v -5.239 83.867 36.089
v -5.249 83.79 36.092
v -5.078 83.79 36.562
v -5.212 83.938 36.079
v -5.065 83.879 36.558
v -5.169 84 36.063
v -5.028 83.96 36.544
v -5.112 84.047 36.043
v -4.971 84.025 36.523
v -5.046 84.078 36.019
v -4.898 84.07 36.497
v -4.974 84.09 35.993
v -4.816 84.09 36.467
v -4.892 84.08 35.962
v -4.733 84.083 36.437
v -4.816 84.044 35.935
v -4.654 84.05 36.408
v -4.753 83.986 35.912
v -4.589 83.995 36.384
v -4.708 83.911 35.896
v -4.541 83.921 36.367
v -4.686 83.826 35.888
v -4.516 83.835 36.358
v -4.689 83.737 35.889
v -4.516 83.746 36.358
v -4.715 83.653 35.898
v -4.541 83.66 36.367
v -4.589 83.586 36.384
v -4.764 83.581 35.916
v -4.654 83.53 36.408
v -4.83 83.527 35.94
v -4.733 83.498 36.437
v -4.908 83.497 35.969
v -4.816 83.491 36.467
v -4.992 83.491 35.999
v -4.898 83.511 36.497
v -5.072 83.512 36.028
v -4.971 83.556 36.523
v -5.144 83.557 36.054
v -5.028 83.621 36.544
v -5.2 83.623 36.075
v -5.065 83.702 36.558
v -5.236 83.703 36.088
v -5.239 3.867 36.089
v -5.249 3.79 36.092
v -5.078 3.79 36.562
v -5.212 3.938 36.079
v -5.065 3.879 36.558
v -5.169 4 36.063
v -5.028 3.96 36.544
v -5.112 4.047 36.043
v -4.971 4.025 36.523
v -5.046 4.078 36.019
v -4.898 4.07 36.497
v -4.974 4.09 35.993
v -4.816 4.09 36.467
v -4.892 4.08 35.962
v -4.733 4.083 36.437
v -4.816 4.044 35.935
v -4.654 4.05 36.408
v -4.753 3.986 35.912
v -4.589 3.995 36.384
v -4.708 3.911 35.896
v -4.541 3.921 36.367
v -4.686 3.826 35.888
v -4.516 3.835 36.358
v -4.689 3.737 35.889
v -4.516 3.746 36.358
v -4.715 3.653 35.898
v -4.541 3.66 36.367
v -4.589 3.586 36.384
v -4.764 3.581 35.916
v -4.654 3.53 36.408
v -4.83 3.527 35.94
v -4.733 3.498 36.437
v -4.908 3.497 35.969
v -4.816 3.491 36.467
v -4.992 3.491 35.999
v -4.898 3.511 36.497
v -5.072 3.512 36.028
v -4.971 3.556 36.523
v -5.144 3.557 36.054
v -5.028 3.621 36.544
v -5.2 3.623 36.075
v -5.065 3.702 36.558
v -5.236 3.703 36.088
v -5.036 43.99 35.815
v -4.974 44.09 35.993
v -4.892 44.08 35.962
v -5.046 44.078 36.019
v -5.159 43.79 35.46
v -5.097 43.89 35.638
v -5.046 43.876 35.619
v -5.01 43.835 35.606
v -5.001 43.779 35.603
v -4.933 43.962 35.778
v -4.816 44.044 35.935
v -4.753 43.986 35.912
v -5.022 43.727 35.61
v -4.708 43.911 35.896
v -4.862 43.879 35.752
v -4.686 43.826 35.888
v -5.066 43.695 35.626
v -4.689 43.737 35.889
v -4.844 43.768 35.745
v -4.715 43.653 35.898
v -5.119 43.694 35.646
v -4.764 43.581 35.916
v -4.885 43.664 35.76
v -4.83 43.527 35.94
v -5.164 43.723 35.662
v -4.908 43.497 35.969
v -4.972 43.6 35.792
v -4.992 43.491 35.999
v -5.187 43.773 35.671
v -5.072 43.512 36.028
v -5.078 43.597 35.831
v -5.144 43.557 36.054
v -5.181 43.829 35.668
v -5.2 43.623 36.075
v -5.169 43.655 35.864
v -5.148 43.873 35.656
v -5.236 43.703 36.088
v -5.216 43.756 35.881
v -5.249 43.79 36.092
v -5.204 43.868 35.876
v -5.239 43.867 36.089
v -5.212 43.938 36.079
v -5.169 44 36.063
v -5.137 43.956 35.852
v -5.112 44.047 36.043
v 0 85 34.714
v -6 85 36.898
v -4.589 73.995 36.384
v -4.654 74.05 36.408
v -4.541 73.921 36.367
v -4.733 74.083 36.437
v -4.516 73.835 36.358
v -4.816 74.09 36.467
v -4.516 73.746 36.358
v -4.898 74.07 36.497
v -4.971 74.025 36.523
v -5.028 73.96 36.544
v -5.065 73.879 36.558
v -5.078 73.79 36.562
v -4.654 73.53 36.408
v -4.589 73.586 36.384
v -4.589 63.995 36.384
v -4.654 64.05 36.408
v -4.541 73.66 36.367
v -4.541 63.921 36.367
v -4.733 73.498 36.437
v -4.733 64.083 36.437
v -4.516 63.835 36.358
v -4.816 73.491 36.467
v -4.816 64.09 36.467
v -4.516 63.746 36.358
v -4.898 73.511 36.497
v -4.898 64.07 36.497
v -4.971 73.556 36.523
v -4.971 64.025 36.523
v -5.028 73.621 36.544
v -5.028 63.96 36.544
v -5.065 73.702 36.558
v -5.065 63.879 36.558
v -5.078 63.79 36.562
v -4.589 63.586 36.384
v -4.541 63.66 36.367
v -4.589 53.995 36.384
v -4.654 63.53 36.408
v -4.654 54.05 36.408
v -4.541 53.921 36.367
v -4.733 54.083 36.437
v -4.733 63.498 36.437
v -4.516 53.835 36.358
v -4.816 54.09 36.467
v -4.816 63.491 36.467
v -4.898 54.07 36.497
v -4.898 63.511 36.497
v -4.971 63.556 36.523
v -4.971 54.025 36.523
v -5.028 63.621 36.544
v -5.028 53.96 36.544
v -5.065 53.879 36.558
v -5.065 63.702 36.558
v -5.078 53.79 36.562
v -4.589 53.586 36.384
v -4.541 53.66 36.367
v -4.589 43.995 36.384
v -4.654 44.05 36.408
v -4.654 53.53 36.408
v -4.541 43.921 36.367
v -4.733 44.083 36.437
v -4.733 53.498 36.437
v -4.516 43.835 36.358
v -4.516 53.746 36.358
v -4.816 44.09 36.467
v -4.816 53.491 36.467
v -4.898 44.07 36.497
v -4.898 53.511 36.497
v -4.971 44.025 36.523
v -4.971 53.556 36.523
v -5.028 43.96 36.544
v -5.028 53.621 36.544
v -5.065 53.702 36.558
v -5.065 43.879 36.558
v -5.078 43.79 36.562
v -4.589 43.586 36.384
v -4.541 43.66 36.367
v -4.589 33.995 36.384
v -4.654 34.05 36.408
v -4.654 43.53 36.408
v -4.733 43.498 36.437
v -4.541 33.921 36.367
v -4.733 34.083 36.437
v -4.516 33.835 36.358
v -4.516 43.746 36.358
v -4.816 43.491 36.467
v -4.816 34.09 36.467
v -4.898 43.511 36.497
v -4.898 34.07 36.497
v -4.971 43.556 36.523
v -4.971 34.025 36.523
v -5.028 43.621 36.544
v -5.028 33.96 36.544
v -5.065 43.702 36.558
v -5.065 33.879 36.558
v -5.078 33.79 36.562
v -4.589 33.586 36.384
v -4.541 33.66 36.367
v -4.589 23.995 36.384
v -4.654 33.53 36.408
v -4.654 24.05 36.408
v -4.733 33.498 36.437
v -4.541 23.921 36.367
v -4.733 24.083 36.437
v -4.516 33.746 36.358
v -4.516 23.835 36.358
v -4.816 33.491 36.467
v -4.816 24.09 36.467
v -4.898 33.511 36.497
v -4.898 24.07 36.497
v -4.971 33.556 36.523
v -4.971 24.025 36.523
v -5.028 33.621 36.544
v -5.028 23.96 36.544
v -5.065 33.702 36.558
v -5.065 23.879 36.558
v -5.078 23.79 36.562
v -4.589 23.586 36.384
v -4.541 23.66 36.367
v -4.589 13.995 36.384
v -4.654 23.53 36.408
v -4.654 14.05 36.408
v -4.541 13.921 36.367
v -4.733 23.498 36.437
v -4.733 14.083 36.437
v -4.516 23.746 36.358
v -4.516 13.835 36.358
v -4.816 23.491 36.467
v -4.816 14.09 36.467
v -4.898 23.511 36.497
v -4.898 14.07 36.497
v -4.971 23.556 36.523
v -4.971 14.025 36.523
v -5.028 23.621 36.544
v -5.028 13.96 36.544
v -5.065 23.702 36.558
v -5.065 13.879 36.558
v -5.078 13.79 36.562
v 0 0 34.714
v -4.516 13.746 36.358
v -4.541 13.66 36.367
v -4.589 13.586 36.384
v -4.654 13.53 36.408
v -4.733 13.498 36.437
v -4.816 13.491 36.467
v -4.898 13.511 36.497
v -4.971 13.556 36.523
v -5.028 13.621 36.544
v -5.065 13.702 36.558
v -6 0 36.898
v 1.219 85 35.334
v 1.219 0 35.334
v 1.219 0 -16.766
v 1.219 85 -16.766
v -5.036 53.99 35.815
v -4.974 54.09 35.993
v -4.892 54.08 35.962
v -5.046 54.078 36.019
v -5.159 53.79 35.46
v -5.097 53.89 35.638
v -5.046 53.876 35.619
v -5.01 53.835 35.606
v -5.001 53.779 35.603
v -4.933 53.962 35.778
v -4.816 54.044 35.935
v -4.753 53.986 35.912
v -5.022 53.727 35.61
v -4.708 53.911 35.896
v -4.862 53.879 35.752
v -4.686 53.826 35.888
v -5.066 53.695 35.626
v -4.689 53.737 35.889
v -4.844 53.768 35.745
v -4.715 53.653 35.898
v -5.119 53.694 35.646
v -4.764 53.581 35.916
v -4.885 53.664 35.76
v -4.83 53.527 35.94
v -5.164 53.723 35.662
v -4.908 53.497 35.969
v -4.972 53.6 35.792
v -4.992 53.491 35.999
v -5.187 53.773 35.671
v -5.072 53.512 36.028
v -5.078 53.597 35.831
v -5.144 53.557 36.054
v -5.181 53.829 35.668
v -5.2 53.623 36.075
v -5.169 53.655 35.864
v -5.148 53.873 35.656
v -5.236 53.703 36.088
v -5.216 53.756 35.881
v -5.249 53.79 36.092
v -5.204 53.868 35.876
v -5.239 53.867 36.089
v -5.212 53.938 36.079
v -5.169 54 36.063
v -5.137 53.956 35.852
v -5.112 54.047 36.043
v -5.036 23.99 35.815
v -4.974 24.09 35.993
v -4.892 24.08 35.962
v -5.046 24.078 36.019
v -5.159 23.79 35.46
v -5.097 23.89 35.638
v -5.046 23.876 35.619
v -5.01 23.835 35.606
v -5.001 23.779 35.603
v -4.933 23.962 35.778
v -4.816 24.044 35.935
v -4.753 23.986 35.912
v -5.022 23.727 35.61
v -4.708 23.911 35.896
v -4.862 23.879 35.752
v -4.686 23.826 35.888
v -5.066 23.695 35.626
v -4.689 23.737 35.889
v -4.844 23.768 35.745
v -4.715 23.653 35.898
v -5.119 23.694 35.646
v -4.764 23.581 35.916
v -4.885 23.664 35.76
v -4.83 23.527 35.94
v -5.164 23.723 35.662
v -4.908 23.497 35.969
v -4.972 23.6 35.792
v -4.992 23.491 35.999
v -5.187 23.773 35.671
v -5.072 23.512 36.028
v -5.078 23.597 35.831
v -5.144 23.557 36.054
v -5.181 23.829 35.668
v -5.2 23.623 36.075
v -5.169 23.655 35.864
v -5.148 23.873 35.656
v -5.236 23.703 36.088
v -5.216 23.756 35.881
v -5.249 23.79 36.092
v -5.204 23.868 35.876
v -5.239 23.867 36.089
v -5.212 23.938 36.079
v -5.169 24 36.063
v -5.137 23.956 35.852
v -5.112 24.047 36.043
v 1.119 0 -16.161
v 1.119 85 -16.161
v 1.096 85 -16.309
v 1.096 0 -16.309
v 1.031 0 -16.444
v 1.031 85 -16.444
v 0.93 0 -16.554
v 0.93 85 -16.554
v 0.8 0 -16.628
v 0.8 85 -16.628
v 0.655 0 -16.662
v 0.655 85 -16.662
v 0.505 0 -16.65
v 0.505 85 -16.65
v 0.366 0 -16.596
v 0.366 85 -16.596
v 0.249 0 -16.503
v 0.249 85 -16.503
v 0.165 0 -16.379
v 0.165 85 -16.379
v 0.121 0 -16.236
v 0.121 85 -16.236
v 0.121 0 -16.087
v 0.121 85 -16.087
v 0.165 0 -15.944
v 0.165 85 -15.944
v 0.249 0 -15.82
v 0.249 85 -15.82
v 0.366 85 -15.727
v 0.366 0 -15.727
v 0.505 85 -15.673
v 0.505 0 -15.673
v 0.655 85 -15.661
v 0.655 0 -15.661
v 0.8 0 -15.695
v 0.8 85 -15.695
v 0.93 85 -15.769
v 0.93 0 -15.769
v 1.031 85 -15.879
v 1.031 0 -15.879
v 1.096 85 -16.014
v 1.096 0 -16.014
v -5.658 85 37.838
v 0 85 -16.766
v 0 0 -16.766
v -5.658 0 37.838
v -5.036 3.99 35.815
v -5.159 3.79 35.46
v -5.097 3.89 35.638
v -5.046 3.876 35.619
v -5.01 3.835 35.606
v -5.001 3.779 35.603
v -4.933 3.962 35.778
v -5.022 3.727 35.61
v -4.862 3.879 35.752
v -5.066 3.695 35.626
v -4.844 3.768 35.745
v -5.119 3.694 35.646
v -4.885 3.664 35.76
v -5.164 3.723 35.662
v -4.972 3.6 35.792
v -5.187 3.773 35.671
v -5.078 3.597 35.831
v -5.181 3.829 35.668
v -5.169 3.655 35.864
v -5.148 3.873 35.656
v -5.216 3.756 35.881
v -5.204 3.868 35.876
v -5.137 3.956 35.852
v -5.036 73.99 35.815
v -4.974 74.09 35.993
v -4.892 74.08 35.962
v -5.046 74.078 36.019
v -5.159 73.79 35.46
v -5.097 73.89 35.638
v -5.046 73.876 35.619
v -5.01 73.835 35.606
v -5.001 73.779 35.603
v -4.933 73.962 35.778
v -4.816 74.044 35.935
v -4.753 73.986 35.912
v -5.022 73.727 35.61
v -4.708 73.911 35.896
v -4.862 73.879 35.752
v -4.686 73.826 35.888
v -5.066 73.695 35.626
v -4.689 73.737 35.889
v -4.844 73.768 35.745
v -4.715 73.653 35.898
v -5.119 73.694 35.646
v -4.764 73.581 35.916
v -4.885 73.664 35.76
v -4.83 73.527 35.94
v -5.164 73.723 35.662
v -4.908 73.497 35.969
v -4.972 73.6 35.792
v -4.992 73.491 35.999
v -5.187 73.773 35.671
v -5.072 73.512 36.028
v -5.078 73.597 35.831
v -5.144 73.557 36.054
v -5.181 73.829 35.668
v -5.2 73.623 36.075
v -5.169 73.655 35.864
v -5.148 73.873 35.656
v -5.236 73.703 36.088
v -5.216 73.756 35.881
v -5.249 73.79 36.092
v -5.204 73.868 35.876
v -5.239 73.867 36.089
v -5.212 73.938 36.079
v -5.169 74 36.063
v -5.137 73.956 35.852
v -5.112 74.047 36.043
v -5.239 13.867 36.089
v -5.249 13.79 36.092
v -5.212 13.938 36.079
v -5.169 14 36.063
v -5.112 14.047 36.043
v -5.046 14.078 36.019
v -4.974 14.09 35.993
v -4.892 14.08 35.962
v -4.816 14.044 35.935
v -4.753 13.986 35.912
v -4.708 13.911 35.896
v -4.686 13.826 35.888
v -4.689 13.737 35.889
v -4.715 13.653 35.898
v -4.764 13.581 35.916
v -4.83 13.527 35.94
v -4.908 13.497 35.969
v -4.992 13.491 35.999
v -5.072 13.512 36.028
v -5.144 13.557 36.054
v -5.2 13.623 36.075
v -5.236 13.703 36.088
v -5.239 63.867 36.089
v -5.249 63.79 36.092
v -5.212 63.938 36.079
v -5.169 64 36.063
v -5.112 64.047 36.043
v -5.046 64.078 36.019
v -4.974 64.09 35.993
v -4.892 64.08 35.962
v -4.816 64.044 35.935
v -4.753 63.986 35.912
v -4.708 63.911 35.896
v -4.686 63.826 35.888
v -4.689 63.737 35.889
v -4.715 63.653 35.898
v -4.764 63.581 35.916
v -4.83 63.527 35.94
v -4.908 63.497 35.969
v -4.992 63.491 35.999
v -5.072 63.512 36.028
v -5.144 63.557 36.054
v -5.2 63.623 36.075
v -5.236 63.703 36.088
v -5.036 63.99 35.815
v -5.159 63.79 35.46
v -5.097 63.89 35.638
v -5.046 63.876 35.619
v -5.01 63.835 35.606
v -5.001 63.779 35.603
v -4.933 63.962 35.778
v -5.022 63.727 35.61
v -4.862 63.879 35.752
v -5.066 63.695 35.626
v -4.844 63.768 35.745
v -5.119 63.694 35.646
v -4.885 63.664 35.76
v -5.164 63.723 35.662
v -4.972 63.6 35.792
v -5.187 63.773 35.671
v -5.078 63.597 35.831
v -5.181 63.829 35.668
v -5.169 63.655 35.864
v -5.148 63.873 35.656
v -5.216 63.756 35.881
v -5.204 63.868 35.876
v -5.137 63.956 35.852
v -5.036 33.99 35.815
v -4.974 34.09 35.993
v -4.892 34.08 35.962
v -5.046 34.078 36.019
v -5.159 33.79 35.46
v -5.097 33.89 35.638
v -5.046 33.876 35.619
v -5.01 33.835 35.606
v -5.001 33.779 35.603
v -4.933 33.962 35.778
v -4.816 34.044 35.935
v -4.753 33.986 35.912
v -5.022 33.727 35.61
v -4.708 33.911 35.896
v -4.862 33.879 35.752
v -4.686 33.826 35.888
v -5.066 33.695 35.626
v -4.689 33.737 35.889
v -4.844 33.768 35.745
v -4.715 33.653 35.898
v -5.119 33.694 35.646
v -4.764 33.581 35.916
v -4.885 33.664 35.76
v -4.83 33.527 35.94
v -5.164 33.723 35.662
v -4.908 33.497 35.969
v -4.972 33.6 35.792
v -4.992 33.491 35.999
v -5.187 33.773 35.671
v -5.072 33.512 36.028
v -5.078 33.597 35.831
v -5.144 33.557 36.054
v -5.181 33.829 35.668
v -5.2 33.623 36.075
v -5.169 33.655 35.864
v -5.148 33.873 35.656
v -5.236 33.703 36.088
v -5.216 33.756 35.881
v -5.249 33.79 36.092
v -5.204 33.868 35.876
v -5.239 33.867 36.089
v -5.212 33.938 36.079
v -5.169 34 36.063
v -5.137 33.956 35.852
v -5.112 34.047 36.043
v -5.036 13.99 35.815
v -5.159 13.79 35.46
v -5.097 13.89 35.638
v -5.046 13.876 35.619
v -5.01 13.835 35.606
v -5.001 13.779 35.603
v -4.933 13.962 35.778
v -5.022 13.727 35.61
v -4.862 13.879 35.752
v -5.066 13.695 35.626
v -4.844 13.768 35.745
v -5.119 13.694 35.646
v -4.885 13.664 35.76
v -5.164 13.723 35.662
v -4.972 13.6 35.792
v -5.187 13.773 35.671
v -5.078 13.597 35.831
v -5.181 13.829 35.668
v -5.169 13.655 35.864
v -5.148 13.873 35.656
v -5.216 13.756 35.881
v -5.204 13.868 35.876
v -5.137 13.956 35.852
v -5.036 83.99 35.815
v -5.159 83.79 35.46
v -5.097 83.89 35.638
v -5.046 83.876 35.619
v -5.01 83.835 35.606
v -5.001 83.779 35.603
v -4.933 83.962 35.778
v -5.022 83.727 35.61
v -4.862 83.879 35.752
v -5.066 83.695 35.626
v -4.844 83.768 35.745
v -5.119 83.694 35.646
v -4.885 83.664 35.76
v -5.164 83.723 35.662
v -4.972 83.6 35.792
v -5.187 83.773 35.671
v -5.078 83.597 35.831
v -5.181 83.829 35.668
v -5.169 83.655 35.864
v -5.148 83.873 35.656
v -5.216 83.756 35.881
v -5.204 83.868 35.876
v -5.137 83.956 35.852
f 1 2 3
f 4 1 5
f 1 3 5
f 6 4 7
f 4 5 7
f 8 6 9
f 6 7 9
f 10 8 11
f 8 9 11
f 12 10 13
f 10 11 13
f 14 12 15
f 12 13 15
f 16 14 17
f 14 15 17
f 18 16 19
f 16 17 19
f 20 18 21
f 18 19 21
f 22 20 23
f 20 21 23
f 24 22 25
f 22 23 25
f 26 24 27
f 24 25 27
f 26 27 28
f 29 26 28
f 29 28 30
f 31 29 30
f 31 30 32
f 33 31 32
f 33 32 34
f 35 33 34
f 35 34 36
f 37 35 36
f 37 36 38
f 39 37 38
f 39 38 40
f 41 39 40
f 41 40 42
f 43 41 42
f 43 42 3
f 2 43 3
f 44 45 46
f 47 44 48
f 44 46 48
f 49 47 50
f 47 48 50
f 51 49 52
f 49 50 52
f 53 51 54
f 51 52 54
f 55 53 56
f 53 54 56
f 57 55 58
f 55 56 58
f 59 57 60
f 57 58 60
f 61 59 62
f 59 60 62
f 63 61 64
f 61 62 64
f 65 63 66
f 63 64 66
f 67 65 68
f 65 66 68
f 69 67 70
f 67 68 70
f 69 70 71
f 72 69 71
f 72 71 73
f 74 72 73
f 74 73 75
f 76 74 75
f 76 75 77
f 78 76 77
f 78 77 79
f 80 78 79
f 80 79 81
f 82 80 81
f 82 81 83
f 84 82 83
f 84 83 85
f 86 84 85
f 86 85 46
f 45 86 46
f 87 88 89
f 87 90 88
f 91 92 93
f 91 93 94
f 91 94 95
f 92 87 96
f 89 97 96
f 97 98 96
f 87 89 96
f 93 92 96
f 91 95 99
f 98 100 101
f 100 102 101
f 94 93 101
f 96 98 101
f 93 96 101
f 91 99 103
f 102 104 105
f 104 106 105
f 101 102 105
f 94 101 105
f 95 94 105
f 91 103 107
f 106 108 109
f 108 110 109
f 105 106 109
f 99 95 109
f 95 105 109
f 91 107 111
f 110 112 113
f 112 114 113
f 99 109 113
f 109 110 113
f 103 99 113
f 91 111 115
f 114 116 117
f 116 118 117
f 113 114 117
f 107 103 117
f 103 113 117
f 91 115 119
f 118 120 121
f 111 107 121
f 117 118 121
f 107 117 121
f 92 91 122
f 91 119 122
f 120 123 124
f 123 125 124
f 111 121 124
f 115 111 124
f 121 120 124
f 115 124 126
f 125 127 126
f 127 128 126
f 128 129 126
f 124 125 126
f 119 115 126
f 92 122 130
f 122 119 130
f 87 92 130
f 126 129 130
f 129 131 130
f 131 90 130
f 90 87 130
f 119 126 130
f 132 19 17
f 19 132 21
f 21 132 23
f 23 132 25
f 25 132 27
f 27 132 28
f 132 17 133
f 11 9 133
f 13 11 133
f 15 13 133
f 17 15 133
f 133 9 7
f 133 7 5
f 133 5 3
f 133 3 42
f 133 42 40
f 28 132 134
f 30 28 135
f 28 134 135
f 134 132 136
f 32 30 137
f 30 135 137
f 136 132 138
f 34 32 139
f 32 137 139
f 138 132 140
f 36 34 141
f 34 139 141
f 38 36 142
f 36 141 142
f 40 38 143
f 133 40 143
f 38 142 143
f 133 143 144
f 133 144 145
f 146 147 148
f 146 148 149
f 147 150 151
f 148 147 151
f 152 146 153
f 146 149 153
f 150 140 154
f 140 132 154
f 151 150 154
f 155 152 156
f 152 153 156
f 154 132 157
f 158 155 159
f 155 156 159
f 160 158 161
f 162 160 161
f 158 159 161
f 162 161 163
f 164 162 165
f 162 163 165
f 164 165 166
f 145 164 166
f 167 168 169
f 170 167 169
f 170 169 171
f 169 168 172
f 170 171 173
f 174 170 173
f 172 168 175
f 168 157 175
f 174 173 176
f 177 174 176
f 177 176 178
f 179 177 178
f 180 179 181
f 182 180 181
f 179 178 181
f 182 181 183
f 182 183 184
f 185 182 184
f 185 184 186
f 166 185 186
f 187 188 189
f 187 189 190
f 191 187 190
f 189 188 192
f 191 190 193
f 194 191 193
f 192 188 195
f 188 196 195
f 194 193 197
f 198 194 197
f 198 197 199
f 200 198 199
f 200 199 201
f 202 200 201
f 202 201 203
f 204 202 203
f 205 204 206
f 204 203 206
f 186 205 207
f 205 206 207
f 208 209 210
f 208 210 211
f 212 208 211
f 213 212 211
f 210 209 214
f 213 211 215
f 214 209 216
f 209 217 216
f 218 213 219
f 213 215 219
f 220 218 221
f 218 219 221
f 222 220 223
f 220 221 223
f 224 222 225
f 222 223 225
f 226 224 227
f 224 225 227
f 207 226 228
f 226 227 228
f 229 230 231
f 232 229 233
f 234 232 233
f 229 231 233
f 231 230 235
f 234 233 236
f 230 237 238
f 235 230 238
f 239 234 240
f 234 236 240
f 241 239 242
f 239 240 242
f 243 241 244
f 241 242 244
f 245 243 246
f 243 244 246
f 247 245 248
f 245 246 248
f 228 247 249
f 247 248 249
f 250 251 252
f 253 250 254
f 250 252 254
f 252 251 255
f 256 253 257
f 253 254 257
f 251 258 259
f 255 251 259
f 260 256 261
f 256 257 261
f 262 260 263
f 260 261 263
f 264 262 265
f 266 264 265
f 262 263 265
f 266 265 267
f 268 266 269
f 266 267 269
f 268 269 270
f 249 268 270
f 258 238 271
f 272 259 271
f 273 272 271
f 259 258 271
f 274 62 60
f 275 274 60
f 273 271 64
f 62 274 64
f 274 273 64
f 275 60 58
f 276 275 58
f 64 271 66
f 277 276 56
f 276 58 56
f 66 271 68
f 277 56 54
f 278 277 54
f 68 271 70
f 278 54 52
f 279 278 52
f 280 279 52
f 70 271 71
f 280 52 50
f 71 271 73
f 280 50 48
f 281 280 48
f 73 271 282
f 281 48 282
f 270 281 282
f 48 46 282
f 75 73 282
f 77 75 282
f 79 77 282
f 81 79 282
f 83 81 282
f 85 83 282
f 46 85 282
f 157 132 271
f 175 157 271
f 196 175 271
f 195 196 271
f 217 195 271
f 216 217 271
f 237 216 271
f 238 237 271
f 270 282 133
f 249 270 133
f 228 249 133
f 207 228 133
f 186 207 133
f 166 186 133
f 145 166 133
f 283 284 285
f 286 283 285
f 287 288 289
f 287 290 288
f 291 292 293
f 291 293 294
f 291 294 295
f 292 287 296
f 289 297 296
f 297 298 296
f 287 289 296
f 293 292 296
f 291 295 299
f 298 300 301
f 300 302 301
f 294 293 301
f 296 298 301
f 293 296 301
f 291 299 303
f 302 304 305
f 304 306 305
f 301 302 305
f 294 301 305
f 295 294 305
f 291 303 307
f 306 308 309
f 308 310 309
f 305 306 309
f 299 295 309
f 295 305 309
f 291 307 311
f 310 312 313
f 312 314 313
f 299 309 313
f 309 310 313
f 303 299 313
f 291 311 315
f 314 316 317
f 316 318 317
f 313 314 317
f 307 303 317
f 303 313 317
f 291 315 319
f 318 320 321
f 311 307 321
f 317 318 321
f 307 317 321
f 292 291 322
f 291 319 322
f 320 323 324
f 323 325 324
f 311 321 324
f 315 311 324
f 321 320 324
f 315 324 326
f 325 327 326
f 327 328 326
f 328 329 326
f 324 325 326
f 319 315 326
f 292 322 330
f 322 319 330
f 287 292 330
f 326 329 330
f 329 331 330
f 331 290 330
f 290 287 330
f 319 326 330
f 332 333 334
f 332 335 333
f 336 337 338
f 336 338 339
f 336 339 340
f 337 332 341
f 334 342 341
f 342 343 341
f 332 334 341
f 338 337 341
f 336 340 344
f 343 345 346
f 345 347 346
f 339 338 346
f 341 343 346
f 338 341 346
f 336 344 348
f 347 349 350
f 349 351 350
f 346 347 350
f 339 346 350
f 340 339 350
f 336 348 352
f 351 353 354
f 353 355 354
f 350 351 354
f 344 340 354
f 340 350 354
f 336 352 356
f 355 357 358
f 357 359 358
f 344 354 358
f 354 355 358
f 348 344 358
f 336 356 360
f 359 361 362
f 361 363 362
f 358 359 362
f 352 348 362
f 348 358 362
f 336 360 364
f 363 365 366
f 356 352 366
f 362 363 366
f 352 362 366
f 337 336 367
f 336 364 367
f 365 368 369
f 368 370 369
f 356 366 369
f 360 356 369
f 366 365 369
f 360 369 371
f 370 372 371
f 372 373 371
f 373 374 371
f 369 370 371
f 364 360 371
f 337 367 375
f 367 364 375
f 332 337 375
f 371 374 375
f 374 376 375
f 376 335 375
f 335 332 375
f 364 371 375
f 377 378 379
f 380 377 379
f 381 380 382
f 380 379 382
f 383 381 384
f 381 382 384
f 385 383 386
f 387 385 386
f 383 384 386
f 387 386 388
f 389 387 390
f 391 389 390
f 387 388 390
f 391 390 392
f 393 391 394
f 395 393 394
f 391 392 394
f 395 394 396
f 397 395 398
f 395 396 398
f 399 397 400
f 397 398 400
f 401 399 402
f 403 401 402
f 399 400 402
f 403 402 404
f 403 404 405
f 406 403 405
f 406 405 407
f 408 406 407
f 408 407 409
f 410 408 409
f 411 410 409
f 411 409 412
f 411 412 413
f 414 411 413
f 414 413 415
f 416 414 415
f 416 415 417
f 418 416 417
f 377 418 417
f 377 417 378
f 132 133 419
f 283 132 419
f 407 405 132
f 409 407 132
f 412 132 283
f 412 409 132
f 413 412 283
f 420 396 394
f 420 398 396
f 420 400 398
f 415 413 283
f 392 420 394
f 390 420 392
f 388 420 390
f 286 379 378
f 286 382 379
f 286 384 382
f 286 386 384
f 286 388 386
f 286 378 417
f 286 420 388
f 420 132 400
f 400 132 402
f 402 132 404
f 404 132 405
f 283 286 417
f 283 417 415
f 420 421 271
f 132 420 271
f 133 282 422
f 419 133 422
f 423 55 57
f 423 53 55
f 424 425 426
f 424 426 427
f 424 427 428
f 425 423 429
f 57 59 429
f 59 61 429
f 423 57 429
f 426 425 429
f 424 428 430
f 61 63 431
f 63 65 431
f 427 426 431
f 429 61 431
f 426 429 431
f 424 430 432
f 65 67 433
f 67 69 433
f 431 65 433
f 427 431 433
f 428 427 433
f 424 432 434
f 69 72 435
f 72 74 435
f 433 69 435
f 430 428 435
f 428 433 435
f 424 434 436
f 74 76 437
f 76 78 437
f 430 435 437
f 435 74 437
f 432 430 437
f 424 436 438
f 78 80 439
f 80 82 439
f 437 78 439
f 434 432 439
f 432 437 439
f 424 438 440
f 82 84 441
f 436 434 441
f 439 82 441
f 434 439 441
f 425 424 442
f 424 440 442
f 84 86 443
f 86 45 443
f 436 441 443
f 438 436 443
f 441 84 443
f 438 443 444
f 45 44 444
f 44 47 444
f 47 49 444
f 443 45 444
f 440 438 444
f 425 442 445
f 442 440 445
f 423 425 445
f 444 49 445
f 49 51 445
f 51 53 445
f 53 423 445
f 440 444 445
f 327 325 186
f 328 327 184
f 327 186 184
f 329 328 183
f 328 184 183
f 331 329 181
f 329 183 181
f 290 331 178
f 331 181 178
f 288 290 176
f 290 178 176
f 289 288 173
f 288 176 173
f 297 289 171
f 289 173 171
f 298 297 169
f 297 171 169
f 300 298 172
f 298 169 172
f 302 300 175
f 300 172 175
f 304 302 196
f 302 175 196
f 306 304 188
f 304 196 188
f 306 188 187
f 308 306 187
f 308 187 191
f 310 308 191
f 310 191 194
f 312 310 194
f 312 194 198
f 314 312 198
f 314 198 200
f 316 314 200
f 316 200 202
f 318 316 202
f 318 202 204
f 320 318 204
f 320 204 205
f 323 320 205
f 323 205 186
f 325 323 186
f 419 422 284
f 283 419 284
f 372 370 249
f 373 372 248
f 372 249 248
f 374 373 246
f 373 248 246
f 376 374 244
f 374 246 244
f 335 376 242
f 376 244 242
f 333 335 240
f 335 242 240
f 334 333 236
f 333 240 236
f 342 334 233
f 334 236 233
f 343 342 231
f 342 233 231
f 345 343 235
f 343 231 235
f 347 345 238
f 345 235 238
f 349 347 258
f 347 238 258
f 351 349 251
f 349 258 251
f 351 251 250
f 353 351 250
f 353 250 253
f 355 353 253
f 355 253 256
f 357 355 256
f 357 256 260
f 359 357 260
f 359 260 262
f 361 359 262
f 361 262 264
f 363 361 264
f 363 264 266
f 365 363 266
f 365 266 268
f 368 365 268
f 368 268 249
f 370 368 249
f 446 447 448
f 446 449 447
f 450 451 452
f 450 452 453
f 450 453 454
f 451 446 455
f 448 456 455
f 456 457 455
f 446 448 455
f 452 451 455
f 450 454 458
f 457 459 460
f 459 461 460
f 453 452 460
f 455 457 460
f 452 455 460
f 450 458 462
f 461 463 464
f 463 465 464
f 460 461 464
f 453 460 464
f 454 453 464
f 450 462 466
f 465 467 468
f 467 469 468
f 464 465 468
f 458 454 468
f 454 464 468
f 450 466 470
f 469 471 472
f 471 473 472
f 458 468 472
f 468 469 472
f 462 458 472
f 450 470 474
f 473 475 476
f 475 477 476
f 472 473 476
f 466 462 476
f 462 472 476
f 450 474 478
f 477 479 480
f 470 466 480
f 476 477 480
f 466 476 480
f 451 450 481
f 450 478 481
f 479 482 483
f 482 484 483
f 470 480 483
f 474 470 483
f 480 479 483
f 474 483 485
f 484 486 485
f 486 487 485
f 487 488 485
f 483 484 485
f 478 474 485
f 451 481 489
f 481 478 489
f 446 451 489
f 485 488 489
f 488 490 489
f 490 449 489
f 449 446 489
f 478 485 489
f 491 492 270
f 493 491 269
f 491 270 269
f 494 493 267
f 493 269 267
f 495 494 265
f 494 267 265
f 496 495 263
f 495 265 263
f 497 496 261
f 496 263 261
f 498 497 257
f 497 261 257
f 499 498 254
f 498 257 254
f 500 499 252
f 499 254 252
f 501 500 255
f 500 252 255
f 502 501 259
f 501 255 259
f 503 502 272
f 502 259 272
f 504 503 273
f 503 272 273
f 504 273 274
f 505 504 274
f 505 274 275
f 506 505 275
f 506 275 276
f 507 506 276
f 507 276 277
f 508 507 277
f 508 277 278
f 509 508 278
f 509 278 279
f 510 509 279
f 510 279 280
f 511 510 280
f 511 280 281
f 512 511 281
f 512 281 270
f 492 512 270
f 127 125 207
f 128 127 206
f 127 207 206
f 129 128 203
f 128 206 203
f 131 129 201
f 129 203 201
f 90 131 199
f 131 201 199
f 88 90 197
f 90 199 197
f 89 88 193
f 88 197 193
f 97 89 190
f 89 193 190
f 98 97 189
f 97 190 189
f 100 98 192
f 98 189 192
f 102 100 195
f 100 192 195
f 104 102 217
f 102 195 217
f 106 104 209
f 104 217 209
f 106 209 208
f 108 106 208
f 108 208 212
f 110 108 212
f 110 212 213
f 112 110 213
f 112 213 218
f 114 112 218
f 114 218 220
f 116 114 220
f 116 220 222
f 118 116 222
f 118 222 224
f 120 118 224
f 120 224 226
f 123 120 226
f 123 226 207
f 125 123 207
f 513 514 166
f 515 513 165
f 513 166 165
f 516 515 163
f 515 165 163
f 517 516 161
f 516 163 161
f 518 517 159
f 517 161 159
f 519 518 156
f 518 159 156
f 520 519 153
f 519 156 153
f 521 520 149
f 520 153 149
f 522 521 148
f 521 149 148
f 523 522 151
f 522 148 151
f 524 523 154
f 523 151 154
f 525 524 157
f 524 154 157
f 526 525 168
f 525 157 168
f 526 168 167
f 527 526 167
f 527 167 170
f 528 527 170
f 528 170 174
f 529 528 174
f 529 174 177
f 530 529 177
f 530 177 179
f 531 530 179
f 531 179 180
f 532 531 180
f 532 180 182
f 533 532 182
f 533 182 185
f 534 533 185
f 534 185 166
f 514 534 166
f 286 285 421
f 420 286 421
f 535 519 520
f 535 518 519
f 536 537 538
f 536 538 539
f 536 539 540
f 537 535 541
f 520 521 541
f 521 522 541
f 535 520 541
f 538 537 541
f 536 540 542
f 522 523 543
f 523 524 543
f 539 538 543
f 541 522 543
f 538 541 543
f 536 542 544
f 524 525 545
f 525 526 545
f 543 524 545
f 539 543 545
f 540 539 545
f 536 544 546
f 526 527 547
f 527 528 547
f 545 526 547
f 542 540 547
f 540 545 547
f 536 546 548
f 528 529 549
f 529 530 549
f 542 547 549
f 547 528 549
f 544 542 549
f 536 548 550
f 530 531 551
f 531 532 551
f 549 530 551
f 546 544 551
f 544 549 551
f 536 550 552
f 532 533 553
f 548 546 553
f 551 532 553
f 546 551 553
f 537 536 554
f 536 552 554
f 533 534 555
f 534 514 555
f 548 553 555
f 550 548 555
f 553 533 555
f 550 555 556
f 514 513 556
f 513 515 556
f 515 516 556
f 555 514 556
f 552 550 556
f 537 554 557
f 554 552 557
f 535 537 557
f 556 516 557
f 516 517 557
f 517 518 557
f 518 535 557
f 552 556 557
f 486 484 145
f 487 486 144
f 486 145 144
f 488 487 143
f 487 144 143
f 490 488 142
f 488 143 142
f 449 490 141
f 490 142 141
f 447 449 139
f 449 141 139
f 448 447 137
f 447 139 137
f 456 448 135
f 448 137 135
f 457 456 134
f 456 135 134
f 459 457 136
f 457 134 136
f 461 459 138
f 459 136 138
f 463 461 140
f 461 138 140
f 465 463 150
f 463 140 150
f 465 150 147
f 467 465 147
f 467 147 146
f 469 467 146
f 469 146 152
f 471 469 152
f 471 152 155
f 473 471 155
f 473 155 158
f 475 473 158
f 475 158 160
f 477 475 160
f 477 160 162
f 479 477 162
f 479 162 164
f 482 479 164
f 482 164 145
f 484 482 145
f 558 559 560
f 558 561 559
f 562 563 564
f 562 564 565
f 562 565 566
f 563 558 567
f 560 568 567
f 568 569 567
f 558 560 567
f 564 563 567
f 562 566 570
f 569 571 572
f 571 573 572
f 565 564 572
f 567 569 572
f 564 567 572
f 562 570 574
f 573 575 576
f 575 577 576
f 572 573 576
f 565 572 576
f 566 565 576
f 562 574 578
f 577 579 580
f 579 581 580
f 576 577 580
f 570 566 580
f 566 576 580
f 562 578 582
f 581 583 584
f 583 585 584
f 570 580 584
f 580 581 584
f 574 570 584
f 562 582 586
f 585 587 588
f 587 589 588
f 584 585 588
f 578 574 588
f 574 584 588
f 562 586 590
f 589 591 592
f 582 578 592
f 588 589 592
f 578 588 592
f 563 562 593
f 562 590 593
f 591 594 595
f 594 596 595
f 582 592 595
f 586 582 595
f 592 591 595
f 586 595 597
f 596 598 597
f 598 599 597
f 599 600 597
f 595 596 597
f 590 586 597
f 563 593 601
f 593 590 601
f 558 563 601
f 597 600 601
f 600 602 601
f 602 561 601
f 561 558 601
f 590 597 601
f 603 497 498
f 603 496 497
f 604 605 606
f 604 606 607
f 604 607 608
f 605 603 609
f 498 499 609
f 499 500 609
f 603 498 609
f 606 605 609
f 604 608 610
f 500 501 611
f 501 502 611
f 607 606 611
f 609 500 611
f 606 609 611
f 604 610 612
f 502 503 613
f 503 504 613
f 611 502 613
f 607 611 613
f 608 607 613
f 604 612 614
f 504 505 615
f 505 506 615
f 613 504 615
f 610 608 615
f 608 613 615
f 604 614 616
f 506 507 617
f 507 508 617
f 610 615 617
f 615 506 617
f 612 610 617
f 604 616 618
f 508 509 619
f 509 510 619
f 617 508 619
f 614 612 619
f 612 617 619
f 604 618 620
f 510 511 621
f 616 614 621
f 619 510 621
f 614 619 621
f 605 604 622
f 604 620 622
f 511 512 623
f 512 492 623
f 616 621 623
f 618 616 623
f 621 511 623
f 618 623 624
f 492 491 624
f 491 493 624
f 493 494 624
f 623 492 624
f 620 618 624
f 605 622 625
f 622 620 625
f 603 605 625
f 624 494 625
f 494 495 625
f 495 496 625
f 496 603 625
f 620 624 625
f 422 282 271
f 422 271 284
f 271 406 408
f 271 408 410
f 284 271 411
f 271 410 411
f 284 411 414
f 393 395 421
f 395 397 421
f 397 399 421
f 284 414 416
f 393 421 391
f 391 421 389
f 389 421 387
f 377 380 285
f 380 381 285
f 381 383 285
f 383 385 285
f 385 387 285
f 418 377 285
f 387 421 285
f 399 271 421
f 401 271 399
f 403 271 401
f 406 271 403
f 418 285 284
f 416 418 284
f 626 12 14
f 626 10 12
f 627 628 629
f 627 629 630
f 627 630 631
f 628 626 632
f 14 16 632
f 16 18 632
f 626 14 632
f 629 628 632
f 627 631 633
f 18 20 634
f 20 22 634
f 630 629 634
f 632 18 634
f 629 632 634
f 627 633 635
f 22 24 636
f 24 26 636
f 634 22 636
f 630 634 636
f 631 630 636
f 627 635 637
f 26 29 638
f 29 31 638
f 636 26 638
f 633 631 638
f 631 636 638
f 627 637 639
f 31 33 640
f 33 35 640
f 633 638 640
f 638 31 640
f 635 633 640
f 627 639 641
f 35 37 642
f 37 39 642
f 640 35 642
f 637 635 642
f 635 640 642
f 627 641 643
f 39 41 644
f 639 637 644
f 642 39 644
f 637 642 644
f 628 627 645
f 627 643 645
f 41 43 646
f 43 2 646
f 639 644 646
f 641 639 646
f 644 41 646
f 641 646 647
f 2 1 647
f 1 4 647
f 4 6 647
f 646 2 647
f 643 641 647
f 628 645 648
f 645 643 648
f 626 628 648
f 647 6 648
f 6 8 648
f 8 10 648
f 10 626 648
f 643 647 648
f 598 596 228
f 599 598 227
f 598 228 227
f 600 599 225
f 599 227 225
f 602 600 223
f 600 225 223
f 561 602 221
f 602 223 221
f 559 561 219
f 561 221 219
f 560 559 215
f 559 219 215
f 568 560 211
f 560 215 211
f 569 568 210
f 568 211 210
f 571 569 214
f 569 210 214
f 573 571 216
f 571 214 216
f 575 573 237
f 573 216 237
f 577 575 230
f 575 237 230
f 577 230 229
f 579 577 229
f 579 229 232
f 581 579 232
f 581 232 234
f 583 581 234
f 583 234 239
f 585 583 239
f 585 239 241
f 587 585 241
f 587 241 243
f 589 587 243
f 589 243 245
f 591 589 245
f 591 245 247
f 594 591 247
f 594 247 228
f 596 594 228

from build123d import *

# Parameters (mm, degrees)
BOSS_EXTRUDE1_DEPTH = 85
SKETCH6_R           = 0.501484151
CUT_EXTRUDE1_DEPTH  = 94.234565894
SKETCH7_R           = 0.300235793
BOSS_EXTRUDE2_DEPTH = 0.5
LPATTERN1_COUNT     = 9
LPATTERN1_PITCH     = 10


with BuildPart() as part:
    # Sketch5 → Boss-Extrude1 (new body)
    with BuildSketch(Plane(origin=(0, 0, 0), x_dir=(1, 0, 0), z_dir=(0, 1, 0))):
        Polygon((0, 16.765910013), (0, -34.714089987), (-6, -36.897911392), (-5.657979857, -37.837604013), (1.219310648, -35.334474977), (1.219310648, 16.765910013), align=None)
    extrude(amount=BOSS_EXTRUDE1_DEPTH)

    # Sketch6 → Cut-Extrude1 (cut, through all)
    with BuildSketch(Plane(origin=(0, 85, 0), x_dir=(1, 0, 0), z_dir=(0, 1, 0))):
        with Locations((0.617040076, 16.161484854)):
            Circle(SKETCH6_R)
    extrude(amount=-CUT_EXTRUDE1_DEPTH, mode=Mode.SUBTRACT)

    # Sketch7 → Boss-Extrude2 (add)
    with BuildSketch(Plane(origin=(11.156893463, 0, 30.65331286), x_dir=(-0.9396926207859091, 0, 0.3420201433256667), z_dir=(-0.34202014332566677, 0, -0.9396926207859092))):
        with Locations((16.976051075, 83.790382872)):
            Circle(SKETCH7_R)
    boss_extrude2 = extrude(amount=BOSS_EXTRUDE2_DEPTH)

    # Sketch10 → Revolve1 (revolve)
    with BuildSketch(Plane(origin=(-13.67960191, -0.418101739, 4.978967912), x_dir=(0.34171959685752173, 0.010444277455924904, 0.9397439194759158), z_dir=(-0.939305295450006, -0.02870881626841483, 0.3418791684324207))):
        Polygon((33.002180094, 84.203214447), (33.002180094, 83.902962264), (32.435969012, 83.908878691), align=None)
    revolve1 = revolve(axis=Axis((-4.965313546, 83.790382872, 35.992565984), (-0.34202014332567104, 0, -0.9396926207859075)))

    # LPattern1: Boss-Extrude2, Revolve1 ×9
    with Locations(*[(0, -i * LPATTERN1_PITCH, 0) for i in range(1, LPATTERN1_COUNT)]):
        add(boss_extrude2)
        add(revolve1)


solid = part.part
